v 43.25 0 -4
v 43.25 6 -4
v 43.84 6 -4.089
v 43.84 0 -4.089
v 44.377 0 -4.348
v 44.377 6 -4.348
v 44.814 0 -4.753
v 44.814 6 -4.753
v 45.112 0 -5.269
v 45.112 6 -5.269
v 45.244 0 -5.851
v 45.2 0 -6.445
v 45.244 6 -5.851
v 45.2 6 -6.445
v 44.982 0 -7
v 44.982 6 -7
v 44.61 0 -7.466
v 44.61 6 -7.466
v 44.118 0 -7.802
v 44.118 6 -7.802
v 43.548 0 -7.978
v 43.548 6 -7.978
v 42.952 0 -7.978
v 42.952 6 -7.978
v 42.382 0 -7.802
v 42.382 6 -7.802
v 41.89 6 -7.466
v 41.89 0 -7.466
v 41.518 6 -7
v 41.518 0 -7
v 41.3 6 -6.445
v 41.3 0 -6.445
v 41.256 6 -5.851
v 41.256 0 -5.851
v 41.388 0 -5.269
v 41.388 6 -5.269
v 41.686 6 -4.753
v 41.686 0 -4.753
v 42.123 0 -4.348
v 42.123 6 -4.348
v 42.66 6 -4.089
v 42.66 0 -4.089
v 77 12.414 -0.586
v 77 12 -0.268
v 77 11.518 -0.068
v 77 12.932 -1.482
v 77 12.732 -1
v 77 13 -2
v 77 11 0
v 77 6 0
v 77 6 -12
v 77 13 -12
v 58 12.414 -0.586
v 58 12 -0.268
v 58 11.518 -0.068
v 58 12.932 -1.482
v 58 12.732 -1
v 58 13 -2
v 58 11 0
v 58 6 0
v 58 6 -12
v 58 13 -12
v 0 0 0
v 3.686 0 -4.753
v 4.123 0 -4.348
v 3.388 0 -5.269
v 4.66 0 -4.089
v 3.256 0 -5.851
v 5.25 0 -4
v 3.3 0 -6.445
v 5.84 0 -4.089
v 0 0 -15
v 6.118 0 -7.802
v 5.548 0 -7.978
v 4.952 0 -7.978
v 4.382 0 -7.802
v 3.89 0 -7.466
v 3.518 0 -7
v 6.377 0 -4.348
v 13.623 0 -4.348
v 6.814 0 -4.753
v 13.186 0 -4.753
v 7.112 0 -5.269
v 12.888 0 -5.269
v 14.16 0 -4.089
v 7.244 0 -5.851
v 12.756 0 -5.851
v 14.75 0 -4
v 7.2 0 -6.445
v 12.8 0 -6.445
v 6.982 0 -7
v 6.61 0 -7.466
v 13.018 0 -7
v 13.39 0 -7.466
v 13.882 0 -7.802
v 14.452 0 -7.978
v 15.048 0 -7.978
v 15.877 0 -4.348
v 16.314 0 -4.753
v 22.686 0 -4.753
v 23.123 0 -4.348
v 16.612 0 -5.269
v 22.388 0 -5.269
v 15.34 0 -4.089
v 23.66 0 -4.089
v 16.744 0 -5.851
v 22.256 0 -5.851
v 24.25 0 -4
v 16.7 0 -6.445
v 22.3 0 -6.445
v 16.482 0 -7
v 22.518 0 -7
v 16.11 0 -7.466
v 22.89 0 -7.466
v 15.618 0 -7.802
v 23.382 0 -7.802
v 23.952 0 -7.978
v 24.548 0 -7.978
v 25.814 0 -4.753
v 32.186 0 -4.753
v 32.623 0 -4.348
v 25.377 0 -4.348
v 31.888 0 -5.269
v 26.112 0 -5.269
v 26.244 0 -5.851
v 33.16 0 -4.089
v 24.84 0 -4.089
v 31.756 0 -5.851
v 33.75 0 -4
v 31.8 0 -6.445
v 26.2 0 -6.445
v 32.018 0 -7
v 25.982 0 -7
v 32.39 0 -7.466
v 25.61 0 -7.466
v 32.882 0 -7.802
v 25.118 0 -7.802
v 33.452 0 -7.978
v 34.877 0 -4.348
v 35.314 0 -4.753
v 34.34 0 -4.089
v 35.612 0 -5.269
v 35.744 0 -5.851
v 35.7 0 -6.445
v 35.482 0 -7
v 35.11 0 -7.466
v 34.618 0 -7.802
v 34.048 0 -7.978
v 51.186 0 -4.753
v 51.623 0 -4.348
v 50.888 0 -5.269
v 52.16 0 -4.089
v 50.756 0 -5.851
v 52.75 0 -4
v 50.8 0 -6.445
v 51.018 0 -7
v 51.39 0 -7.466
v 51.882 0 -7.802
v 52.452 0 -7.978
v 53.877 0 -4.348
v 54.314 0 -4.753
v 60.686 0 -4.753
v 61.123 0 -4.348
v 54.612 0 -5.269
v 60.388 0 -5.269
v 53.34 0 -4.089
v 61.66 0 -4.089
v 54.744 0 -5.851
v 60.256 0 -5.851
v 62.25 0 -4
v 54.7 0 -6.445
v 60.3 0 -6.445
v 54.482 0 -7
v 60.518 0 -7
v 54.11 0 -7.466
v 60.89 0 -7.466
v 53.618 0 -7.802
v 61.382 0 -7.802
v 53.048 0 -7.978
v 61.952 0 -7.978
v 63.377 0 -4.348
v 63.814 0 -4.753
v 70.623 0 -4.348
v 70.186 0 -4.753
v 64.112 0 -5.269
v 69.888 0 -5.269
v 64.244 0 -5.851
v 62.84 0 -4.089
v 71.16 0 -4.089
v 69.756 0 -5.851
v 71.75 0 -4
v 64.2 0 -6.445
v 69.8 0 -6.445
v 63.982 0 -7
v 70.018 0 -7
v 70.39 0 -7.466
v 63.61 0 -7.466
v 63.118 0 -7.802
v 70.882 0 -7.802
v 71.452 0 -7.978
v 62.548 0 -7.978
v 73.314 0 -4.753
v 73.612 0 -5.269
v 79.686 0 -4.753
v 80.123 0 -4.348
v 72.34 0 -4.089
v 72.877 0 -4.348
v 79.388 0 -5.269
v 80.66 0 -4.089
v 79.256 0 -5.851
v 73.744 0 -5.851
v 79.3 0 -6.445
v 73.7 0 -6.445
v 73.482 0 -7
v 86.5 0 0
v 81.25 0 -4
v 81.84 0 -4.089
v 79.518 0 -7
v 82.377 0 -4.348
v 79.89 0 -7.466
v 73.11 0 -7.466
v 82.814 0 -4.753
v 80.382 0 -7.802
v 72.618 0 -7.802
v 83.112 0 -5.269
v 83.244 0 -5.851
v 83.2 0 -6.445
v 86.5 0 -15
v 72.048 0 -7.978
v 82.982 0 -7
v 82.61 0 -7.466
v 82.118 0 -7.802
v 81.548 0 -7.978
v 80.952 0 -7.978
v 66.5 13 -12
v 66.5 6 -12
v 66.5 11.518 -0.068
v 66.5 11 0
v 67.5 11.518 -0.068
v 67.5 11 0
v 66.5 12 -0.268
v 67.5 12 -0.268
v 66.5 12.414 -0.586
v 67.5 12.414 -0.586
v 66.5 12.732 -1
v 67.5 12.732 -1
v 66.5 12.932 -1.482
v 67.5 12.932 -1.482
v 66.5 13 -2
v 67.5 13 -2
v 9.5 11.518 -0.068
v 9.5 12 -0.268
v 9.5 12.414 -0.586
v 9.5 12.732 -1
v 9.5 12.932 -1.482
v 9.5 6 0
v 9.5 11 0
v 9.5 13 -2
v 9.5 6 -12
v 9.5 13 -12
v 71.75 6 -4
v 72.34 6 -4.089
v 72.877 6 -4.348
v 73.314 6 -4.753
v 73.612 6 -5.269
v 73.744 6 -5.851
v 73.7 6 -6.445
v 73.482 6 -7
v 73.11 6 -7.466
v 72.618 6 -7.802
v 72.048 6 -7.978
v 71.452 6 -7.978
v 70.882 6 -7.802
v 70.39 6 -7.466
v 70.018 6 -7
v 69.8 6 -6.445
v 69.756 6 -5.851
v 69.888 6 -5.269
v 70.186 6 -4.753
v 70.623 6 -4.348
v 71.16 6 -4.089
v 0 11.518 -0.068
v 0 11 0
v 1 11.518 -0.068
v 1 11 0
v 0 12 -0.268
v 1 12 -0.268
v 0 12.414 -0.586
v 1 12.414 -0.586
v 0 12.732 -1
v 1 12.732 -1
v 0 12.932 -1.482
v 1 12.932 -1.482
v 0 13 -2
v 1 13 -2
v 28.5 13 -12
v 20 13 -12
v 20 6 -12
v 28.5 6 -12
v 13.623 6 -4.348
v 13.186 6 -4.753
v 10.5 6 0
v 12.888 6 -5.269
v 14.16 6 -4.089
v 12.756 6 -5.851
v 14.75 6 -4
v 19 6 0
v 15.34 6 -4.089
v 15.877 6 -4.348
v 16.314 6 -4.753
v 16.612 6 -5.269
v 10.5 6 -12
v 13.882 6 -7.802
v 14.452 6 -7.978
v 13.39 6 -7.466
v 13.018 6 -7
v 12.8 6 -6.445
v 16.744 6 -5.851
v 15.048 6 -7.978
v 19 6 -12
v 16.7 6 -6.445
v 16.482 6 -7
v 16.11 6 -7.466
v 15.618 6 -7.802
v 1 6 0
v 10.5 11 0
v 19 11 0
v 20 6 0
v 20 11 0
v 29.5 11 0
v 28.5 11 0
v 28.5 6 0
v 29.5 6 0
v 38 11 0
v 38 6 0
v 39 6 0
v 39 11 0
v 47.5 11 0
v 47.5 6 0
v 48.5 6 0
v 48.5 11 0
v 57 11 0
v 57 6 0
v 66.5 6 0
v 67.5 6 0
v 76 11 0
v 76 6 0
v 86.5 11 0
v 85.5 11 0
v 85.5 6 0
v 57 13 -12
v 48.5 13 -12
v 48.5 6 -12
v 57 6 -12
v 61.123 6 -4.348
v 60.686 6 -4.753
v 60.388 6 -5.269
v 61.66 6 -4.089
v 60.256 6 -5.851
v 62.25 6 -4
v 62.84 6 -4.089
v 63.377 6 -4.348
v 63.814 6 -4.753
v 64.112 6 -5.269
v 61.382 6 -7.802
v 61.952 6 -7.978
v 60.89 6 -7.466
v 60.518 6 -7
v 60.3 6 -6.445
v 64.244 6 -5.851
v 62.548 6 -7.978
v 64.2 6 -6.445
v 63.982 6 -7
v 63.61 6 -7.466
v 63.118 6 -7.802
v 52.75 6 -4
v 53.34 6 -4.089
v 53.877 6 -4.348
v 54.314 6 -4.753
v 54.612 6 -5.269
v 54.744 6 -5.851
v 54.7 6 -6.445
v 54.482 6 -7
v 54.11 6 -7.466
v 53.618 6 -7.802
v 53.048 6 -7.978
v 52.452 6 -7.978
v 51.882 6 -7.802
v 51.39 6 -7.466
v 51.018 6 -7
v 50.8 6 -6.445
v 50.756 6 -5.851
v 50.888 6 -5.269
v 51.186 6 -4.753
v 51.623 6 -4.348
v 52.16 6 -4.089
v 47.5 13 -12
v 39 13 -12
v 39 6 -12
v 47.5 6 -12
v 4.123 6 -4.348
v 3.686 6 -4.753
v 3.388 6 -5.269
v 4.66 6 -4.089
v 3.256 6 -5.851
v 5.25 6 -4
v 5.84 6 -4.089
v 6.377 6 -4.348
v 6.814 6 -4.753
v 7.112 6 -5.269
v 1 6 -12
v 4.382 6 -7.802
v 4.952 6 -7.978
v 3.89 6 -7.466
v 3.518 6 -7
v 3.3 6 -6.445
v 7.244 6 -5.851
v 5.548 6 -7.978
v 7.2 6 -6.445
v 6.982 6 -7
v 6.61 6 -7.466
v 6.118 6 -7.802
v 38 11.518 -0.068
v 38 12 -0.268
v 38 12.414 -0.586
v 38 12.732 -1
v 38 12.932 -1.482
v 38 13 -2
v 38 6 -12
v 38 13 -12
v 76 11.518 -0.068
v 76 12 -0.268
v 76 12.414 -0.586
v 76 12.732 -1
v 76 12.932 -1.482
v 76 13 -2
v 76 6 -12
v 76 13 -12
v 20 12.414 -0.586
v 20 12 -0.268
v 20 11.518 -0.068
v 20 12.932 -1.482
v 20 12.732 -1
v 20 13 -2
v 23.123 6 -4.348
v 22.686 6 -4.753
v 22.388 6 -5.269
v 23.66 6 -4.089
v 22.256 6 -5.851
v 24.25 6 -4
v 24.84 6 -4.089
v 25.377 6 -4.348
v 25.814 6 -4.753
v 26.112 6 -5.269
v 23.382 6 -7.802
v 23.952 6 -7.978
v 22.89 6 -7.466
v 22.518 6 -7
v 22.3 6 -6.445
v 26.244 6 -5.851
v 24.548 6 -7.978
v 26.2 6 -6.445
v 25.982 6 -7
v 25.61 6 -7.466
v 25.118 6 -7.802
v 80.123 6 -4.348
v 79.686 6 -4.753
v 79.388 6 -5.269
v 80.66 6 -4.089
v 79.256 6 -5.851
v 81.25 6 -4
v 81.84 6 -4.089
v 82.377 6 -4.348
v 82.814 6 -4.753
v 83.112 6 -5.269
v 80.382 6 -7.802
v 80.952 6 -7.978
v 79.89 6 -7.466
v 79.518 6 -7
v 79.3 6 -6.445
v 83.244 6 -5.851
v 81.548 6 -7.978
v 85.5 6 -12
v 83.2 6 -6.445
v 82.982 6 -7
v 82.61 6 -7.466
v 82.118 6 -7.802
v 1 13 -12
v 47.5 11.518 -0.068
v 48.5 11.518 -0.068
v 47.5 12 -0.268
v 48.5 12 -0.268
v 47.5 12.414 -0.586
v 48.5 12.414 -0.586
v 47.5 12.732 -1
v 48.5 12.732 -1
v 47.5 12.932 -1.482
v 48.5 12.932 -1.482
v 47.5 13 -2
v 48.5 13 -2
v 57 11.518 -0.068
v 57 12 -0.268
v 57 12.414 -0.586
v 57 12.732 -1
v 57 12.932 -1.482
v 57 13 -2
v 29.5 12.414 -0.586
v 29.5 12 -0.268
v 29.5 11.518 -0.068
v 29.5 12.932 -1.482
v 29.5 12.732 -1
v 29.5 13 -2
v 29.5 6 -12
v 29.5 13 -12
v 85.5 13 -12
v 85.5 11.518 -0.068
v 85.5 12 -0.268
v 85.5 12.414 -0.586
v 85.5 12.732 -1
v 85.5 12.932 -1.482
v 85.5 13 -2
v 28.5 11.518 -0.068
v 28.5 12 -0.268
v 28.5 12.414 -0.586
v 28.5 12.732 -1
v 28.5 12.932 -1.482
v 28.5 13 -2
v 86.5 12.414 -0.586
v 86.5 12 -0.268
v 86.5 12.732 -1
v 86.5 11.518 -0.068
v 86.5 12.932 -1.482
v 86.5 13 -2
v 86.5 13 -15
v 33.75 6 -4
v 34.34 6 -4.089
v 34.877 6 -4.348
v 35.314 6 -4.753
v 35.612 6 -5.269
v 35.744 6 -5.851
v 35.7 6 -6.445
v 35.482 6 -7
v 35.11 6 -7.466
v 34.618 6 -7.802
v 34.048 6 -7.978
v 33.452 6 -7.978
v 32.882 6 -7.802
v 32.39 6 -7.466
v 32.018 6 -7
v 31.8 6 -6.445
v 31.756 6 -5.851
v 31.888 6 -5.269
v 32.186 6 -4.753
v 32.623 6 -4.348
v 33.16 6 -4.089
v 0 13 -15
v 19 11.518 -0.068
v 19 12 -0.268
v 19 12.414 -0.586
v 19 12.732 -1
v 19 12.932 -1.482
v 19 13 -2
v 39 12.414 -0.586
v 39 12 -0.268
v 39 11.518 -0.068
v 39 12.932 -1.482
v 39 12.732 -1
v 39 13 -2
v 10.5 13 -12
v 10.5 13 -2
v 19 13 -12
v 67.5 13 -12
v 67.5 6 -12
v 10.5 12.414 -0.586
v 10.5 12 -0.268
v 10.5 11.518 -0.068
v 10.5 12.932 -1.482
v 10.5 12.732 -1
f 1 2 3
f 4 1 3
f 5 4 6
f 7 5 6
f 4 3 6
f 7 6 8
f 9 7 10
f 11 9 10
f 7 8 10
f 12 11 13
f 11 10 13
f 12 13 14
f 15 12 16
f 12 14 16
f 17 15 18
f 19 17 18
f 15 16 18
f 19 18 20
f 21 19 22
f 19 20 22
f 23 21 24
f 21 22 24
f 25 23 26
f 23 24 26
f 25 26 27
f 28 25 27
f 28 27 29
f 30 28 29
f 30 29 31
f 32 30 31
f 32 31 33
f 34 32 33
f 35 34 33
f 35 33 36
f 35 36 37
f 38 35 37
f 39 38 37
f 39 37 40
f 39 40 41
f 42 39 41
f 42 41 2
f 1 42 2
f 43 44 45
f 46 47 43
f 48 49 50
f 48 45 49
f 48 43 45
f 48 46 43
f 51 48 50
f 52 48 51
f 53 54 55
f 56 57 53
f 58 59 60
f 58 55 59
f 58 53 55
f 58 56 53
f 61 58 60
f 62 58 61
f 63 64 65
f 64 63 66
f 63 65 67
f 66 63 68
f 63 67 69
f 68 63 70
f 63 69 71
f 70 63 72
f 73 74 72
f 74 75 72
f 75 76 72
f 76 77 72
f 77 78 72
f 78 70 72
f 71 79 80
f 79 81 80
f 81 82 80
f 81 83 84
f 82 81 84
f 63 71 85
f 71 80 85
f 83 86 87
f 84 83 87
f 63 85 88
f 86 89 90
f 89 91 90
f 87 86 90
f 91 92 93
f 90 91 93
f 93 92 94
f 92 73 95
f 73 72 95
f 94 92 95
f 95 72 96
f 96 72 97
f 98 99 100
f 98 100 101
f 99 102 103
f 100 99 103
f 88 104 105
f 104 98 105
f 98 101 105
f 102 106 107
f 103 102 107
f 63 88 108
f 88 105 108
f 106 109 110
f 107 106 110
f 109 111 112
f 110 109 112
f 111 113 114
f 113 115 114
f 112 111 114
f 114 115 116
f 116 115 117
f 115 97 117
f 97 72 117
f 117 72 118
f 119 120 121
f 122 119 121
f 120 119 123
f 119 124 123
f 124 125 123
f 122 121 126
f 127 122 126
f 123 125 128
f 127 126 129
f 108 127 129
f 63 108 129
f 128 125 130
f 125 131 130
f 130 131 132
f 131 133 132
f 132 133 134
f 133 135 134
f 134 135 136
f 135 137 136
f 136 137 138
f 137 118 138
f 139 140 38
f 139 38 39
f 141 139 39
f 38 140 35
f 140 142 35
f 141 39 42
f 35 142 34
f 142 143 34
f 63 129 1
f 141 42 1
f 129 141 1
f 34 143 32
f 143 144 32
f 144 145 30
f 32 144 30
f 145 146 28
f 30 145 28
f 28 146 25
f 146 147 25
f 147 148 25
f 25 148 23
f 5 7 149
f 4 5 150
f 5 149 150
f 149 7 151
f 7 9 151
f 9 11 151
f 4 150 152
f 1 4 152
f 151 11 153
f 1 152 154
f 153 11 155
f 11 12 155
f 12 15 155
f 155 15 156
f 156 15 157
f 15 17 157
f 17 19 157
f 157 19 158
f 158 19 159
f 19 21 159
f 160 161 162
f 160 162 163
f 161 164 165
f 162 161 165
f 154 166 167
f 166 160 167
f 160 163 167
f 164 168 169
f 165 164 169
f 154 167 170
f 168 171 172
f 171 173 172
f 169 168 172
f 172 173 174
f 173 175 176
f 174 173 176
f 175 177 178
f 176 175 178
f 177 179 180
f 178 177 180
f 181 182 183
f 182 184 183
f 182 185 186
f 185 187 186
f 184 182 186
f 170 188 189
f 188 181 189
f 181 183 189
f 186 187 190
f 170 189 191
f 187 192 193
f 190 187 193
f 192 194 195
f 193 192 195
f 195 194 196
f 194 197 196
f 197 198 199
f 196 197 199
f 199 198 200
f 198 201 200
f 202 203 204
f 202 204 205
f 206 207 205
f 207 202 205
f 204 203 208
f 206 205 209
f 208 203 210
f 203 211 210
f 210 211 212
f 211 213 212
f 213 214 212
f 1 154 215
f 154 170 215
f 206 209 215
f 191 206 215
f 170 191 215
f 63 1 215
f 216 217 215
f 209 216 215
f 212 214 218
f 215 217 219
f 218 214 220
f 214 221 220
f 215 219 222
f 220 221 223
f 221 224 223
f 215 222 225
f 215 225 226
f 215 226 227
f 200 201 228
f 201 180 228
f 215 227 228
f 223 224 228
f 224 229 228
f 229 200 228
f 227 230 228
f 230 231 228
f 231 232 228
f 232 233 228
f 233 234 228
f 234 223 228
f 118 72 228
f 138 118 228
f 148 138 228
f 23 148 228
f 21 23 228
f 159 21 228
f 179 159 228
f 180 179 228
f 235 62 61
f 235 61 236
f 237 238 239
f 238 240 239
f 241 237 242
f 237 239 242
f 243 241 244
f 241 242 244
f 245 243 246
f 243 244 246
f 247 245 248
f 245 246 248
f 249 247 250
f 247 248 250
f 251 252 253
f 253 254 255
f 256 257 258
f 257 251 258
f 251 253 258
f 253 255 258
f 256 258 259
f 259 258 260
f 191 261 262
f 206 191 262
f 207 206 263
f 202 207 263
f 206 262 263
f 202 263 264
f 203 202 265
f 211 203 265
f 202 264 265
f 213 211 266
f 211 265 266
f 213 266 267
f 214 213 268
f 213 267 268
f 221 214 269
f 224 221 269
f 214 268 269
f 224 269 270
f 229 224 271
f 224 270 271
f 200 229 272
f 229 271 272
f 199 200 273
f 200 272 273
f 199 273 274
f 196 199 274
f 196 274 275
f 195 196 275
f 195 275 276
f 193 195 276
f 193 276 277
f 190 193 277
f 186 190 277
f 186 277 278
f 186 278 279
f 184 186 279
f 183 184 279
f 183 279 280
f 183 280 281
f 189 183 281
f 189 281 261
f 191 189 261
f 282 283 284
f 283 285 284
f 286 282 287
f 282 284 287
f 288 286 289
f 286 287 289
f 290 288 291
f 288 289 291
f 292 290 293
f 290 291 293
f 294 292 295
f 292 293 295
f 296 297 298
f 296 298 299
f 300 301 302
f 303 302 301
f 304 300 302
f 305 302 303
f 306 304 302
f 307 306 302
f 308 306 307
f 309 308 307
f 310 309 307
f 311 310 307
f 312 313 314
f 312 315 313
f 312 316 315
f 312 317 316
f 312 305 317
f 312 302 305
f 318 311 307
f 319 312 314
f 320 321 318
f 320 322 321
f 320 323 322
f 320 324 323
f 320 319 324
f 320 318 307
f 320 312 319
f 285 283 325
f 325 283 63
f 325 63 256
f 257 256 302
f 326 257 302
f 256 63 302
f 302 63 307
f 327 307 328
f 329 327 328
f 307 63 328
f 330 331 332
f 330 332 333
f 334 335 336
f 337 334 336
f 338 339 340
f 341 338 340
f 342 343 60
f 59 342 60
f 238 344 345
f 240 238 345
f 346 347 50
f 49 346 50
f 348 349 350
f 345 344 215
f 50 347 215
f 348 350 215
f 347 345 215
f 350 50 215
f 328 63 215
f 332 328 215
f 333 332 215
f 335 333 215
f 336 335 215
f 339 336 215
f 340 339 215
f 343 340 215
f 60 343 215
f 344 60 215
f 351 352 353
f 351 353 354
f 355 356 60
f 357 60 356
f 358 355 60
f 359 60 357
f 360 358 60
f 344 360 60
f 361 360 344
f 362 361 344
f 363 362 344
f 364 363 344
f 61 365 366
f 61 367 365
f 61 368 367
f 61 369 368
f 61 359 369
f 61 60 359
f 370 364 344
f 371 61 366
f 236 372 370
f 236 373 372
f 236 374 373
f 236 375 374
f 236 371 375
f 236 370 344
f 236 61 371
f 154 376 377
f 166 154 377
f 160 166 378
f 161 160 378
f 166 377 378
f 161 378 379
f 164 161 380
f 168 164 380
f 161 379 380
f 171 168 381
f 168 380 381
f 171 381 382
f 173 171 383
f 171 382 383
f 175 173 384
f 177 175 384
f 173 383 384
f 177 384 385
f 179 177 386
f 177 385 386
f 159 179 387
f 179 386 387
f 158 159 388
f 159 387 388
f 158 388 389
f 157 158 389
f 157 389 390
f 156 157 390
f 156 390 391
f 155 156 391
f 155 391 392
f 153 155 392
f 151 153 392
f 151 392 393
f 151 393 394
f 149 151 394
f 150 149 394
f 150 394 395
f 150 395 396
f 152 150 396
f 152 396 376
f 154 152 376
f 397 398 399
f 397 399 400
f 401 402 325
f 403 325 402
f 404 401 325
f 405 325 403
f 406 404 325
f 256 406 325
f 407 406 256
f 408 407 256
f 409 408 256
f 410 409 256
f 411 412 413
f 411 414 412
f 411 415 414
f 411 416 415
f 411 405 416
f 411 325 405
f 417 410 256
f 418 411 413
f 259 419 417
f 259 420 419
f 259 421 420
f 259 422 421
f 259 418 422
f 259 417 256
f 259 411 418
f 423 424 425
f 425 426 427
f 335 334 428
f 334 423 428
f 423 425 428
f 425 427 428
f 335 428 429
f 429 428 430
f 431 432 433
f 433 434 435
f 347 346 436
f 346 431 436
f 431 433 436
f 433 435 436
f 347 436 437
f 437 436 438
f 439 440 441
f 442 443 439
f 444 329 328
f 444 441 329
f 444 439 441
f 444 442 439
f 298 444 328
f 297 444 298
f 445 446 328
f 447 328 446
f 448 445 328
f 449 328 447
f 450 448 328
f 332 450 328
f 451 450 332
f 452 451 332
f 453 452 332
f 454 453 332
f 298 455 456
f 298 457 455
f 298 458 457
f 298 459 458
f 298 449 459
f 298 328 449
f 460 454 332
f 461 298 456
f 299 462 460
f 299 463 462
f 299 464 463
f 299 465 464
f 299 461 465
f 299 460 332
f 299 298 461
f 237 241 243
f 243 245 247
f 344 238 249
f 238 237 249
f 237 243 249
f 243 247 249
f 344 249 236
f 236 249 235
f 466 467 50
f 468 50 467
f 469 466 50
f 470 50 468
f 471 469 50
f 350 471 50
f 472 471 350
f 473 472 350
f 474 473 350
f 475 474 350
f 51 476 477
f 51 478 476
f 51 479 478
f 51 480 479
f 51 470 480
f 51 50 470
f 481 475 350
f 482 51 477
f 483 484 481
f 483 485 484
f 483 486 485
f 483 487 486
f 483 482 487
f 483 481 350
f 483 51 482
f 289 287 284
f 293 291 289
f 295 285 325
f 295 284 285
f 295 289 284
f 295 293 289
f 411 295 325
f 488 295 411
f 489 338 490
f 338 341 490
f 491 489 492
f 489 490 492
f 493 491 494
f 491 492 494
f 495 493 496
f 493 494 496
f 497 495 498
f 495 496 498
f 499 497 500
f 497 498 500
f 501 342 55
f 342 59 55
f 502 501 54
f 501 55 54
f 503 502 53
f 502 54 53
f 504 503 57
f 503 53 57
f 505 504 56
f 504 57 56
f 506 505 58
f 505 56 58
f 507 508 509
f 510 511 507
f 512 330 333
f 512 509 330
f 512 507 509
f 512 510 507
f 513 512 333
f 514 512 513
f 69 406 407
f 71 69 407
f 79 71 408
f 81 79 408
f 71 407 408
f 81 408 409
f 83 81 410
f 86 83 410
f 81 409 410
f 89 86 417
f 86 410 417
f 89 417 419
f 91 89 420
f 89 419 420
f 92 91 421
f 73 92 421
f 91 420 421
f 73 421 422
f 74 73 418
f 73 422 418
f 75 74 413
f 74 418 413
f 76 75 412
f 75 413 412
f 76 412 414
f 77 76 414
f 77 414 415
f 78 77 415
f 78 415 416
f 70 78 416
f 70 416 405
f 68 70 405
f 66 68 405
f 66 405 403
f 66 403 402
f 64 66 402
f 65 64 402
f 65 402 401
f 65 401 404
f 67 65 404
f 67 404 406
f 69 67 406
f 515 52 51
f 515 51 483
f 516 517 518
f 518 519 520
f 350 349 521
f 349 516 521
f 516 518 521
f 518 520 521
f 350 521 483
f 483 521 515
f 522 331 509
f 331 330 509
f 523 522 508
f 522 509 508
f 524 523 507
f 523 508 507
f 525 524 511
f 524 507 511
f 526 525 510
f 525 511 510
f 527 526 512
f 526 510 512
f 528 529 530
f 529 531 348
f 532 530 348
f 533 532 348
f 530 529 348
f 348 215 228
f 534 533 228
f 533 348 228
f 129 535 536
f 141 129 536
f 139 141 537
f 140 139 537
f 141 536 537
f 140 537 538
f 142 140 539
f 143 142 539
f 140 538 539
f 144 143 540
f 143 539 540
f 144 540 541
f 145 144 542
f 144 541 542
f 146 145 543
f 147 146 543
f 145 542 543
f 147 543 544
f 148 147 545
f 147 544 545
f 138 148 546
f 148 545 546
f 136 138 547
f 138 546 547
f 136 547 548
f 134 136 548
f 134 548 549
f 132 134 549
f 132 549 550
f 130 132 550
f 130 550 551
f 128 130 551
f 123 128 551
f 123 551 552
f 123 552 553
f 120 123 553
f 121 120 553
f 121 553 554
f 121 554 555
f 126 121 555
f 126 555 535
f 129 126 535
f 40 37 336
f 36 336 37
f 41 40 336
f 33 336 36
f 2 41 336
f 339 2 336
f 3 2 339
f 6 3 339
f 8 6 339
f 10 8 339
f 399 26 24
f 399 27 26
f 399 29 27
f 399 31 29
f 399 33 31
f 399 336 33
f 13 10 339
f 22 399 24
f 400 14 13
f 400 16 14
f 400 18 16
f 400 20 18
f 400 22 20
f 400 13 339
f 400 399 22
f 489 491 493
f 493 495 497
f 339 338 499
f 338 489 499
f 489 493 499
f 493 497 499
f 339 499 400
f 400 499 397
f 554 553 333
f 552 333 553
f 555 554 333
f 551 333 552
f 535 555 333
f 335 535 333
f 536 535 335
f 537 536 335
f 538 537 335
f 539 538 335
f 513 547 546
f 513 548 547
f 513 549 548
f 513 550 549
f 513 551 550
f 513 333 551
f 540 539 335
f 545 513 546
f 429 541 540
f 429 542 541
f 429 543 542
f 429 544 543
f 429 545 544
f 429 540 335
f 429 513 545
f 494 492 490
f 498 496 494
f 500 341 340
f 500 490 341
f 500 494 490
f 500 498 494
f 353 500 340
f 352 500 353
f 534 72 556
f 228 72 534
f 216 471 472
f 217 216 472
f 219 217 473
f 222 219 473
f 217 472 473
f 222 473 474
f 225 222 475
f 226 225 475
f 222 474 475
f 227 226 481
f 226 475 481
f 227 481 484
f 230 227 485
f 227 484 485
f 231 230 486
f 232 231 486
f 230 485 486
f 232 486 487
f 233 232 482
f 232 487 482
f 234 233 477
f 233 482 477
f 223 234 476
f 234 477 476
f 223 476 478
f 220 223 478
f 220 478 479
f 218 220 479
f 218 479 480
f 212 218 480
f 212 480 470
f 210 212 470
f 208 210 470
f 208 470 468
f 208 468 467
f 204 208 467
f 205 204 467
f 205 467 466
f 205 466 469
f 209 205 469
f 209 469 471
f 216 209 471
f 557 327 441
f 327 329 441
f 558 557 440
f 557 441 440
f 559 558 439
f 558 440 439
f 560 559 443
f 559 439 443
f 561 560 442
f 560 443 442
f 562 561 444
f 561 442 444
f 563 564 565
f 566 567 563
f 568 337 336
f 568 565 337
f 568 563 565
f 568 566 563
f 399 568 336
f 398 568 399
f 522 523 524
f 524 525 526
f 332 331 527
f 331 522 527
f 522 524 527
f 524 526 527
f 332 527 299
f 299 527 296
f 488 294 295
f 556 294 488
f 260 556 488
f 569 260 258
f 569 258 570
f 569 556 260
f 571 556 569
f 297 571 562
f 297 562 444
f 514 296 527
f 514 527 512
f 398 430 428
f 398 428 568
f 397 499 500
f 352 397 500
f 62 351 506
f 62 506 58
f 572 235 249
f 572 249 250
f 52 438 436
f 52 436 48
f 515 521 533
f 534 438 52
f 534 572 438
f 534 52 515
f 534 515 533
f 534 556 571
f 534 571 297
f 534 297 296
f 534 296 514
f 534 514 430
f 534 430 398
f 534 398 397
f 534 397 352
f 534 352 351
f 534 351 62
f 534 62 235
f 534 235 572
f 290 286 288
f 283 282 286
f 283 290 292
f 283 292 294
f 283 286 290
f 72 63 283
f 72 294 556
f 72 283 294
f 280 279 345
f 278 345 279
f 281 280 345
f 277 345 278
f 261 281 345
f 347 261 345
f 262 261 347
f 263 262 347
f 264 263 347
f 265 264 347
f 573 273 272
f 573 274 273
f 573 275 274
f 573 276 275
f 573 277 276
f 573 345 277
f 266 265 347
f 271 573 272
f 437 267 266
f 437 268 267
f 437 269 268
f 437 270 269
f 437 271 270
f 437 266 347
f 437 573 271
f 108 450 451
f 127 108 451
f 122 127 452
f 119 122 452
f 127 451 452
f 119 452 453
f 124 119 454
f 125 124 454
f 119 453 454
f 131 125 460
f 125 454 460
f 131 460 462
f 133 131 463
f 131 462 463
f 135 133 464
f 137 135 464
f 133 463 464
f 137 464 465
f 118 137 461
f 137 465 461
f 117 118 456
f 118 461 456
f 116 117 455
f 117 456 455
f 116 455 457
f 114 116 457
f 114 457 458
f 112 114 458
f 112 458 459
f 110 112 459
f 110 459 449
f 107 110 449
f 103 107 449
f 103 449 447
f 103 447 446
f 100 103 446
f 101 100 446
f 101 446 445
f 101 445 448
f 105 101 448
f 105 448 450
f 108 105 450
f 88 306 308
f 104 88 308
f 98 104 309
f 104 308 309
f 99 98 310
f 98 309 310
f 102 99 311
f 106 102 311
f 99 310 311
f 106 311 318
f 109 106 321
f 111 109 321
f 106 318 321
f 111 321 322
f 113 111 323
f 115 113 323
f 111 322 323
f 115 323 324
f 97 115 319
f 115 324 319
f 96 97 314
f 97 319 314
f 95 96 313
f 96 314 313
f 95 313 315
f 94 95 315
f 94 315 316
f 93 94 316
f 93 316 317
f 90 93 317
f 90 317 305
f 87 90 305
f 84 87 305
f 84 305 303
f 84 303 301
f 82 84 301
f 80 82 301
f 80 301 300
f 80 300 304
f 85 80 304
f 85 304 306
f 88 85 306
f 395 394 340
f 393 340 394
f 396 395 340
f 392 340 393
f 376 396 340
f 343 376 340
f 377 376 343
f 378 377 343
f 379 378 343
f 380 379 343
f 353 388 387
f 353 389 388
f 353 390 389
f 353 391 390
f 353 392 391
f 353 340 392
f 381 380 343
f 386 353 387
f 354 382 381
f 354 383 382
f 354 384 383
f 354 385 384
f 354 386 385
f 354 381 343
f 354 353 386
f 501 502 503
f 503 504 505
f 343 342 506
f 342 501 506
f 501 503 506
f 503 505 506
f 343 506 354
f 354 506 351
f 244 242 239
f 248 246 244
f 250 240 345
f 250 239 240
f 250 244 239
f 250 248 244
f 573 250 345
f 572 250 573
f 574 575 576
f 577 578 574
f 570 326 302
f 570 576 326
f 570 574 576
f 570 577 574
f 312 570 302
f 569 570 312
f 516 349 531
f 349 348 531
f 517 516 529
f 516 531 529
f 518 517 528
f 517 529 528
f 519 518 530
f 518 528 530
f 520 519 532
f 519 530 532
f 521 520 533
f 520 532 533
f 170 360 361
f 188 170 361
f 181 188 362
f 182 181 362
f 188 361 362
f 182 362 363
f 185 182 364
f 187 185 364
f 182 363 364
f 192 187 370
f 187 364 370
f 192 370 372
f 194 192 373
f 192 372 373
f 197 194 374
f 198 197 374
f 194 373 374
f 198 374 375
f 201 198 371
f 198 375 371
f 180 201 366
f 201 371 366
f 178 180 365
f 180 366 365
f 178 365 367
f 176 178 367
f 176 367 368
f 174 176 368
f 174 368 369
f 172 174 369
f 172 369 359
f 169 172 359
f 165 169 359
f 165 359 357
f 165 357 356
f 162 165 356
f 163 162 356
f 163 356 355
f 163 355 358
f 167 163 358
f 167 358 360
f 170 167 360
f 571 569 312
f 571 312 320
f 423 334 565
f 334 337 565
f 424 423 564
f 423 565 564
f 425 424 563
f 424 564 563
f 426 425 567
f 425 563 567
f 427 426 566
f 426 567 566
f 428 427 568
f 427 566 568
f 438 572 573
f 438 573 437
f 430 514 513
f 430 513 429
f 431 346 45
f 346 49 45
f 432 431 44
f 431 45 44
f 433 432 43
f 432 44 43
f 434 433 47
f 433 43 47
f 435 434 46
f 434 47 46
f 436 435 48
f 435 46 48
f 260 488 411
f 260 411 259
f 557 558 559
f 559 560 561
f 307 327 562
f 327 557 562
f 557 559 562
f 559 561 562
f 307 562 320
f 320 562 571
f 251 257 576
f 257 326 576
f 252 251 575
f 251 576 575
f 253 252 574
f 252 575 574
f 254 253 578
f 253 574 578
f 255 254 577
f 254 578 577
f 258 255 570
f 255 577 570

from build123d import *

# Parameters (mm, degrees)
SKETCH3_W           = 86.5
SKETCH3_H           = 15
BOSS_EXTRUDE1_DEPTH = 13
SKETCH4_W           = 8.5
SKETCH4_H           = 12
CUT_EXTRUDE1_DEPTH  = 7
LPATTERN1_COUNT     = 9
LPATTERN1_PITCH     = 9.5
FILLET1_R           = 2
SKETCH5_R           = 2
CUT_EXTRUDE2_DEPTH  = 89.069574769
LPATTERN2_COUNT     = 9
LPATTERN2_PITCH     = 9.5


with BuildPart() as part:
    # Sketch3 → Boss-Extrude1 (new body)
    with BuildSketch(Plane(origin=(0, 0, 0), x_dir=(1, 0, 0), z_dir=(0, 1, 0))):
        with Locations((43.25, 7.5)):
            Rectangle(SKETCH3_W, SKETCH3_H)
    extrude(amount=BOSS_EXTRUDE1_DEPTH)

    # Sketch4 → Cut-Extrude1 (cut)
    with BuildSketch(Plane(origin=(0, 13, 0), x_dir=(1, 0, 0), z_dir=(0, 1, 0))):
        with Locations((5.25, 6)):
            Rectangle(SKETCH4_W, SKETCH4_H)
    cut_extrude1 = extrude(amount=-CUT_EXTRUDE1_DEPTH, mode=Mode.SUBTRACT)

    # LPattern1: Cut-Extrude1 ×9
    with Locations(*[(i * LPATTERN1_PITCH, 0, 0) for i in range(1, LPATTERN1_COUNT)]):
        add(cut_extrude1, mode=Mode.SUBTRACT)

    # Fillet1
    fillet1_edges = [part.edges().sort_by_distance(p)[0] for p in [
        (76.5, 13, 0),
        (86, 13, 0),
        (10, 13, 0),
        (19.5, 13, 0),
        (29, 13, 0),
        (38.5, 13, 0),
        (48, 13, 0),
        (0.5, 13, 0),
        (57.5, 13, 0),
        (67, 13, 0),
    ]]
    fillet(fillet1_edges, radius=FILLET1_R)

    # Sketch5 → Cut-Extrude2 (cut, through all)
    with BuildSketch(Plane(origin=(0, 6, 0), x_dir=(1, 0, 0), z_dir=(0, 1, 0))):
        with Locations(Location((5.25, 6, 0), (0, 0, 270))):
            Circle(SKETCH5_R)
    cut_extrude2 = extrude(amount=-CUT_EXTRUDE2_DEPTH, mode=Mode.SUBTRACT)

    # LPattern2: Cut-Extrude2 ×9
    with Locations(*[(i * LPATTERN2_PITCH, 0, 0) for i in range(1, LPATTERN2_COUNT)]):
        add(cut_extrude2, mode=Mode.SUBTRACT)


solid = part.part
